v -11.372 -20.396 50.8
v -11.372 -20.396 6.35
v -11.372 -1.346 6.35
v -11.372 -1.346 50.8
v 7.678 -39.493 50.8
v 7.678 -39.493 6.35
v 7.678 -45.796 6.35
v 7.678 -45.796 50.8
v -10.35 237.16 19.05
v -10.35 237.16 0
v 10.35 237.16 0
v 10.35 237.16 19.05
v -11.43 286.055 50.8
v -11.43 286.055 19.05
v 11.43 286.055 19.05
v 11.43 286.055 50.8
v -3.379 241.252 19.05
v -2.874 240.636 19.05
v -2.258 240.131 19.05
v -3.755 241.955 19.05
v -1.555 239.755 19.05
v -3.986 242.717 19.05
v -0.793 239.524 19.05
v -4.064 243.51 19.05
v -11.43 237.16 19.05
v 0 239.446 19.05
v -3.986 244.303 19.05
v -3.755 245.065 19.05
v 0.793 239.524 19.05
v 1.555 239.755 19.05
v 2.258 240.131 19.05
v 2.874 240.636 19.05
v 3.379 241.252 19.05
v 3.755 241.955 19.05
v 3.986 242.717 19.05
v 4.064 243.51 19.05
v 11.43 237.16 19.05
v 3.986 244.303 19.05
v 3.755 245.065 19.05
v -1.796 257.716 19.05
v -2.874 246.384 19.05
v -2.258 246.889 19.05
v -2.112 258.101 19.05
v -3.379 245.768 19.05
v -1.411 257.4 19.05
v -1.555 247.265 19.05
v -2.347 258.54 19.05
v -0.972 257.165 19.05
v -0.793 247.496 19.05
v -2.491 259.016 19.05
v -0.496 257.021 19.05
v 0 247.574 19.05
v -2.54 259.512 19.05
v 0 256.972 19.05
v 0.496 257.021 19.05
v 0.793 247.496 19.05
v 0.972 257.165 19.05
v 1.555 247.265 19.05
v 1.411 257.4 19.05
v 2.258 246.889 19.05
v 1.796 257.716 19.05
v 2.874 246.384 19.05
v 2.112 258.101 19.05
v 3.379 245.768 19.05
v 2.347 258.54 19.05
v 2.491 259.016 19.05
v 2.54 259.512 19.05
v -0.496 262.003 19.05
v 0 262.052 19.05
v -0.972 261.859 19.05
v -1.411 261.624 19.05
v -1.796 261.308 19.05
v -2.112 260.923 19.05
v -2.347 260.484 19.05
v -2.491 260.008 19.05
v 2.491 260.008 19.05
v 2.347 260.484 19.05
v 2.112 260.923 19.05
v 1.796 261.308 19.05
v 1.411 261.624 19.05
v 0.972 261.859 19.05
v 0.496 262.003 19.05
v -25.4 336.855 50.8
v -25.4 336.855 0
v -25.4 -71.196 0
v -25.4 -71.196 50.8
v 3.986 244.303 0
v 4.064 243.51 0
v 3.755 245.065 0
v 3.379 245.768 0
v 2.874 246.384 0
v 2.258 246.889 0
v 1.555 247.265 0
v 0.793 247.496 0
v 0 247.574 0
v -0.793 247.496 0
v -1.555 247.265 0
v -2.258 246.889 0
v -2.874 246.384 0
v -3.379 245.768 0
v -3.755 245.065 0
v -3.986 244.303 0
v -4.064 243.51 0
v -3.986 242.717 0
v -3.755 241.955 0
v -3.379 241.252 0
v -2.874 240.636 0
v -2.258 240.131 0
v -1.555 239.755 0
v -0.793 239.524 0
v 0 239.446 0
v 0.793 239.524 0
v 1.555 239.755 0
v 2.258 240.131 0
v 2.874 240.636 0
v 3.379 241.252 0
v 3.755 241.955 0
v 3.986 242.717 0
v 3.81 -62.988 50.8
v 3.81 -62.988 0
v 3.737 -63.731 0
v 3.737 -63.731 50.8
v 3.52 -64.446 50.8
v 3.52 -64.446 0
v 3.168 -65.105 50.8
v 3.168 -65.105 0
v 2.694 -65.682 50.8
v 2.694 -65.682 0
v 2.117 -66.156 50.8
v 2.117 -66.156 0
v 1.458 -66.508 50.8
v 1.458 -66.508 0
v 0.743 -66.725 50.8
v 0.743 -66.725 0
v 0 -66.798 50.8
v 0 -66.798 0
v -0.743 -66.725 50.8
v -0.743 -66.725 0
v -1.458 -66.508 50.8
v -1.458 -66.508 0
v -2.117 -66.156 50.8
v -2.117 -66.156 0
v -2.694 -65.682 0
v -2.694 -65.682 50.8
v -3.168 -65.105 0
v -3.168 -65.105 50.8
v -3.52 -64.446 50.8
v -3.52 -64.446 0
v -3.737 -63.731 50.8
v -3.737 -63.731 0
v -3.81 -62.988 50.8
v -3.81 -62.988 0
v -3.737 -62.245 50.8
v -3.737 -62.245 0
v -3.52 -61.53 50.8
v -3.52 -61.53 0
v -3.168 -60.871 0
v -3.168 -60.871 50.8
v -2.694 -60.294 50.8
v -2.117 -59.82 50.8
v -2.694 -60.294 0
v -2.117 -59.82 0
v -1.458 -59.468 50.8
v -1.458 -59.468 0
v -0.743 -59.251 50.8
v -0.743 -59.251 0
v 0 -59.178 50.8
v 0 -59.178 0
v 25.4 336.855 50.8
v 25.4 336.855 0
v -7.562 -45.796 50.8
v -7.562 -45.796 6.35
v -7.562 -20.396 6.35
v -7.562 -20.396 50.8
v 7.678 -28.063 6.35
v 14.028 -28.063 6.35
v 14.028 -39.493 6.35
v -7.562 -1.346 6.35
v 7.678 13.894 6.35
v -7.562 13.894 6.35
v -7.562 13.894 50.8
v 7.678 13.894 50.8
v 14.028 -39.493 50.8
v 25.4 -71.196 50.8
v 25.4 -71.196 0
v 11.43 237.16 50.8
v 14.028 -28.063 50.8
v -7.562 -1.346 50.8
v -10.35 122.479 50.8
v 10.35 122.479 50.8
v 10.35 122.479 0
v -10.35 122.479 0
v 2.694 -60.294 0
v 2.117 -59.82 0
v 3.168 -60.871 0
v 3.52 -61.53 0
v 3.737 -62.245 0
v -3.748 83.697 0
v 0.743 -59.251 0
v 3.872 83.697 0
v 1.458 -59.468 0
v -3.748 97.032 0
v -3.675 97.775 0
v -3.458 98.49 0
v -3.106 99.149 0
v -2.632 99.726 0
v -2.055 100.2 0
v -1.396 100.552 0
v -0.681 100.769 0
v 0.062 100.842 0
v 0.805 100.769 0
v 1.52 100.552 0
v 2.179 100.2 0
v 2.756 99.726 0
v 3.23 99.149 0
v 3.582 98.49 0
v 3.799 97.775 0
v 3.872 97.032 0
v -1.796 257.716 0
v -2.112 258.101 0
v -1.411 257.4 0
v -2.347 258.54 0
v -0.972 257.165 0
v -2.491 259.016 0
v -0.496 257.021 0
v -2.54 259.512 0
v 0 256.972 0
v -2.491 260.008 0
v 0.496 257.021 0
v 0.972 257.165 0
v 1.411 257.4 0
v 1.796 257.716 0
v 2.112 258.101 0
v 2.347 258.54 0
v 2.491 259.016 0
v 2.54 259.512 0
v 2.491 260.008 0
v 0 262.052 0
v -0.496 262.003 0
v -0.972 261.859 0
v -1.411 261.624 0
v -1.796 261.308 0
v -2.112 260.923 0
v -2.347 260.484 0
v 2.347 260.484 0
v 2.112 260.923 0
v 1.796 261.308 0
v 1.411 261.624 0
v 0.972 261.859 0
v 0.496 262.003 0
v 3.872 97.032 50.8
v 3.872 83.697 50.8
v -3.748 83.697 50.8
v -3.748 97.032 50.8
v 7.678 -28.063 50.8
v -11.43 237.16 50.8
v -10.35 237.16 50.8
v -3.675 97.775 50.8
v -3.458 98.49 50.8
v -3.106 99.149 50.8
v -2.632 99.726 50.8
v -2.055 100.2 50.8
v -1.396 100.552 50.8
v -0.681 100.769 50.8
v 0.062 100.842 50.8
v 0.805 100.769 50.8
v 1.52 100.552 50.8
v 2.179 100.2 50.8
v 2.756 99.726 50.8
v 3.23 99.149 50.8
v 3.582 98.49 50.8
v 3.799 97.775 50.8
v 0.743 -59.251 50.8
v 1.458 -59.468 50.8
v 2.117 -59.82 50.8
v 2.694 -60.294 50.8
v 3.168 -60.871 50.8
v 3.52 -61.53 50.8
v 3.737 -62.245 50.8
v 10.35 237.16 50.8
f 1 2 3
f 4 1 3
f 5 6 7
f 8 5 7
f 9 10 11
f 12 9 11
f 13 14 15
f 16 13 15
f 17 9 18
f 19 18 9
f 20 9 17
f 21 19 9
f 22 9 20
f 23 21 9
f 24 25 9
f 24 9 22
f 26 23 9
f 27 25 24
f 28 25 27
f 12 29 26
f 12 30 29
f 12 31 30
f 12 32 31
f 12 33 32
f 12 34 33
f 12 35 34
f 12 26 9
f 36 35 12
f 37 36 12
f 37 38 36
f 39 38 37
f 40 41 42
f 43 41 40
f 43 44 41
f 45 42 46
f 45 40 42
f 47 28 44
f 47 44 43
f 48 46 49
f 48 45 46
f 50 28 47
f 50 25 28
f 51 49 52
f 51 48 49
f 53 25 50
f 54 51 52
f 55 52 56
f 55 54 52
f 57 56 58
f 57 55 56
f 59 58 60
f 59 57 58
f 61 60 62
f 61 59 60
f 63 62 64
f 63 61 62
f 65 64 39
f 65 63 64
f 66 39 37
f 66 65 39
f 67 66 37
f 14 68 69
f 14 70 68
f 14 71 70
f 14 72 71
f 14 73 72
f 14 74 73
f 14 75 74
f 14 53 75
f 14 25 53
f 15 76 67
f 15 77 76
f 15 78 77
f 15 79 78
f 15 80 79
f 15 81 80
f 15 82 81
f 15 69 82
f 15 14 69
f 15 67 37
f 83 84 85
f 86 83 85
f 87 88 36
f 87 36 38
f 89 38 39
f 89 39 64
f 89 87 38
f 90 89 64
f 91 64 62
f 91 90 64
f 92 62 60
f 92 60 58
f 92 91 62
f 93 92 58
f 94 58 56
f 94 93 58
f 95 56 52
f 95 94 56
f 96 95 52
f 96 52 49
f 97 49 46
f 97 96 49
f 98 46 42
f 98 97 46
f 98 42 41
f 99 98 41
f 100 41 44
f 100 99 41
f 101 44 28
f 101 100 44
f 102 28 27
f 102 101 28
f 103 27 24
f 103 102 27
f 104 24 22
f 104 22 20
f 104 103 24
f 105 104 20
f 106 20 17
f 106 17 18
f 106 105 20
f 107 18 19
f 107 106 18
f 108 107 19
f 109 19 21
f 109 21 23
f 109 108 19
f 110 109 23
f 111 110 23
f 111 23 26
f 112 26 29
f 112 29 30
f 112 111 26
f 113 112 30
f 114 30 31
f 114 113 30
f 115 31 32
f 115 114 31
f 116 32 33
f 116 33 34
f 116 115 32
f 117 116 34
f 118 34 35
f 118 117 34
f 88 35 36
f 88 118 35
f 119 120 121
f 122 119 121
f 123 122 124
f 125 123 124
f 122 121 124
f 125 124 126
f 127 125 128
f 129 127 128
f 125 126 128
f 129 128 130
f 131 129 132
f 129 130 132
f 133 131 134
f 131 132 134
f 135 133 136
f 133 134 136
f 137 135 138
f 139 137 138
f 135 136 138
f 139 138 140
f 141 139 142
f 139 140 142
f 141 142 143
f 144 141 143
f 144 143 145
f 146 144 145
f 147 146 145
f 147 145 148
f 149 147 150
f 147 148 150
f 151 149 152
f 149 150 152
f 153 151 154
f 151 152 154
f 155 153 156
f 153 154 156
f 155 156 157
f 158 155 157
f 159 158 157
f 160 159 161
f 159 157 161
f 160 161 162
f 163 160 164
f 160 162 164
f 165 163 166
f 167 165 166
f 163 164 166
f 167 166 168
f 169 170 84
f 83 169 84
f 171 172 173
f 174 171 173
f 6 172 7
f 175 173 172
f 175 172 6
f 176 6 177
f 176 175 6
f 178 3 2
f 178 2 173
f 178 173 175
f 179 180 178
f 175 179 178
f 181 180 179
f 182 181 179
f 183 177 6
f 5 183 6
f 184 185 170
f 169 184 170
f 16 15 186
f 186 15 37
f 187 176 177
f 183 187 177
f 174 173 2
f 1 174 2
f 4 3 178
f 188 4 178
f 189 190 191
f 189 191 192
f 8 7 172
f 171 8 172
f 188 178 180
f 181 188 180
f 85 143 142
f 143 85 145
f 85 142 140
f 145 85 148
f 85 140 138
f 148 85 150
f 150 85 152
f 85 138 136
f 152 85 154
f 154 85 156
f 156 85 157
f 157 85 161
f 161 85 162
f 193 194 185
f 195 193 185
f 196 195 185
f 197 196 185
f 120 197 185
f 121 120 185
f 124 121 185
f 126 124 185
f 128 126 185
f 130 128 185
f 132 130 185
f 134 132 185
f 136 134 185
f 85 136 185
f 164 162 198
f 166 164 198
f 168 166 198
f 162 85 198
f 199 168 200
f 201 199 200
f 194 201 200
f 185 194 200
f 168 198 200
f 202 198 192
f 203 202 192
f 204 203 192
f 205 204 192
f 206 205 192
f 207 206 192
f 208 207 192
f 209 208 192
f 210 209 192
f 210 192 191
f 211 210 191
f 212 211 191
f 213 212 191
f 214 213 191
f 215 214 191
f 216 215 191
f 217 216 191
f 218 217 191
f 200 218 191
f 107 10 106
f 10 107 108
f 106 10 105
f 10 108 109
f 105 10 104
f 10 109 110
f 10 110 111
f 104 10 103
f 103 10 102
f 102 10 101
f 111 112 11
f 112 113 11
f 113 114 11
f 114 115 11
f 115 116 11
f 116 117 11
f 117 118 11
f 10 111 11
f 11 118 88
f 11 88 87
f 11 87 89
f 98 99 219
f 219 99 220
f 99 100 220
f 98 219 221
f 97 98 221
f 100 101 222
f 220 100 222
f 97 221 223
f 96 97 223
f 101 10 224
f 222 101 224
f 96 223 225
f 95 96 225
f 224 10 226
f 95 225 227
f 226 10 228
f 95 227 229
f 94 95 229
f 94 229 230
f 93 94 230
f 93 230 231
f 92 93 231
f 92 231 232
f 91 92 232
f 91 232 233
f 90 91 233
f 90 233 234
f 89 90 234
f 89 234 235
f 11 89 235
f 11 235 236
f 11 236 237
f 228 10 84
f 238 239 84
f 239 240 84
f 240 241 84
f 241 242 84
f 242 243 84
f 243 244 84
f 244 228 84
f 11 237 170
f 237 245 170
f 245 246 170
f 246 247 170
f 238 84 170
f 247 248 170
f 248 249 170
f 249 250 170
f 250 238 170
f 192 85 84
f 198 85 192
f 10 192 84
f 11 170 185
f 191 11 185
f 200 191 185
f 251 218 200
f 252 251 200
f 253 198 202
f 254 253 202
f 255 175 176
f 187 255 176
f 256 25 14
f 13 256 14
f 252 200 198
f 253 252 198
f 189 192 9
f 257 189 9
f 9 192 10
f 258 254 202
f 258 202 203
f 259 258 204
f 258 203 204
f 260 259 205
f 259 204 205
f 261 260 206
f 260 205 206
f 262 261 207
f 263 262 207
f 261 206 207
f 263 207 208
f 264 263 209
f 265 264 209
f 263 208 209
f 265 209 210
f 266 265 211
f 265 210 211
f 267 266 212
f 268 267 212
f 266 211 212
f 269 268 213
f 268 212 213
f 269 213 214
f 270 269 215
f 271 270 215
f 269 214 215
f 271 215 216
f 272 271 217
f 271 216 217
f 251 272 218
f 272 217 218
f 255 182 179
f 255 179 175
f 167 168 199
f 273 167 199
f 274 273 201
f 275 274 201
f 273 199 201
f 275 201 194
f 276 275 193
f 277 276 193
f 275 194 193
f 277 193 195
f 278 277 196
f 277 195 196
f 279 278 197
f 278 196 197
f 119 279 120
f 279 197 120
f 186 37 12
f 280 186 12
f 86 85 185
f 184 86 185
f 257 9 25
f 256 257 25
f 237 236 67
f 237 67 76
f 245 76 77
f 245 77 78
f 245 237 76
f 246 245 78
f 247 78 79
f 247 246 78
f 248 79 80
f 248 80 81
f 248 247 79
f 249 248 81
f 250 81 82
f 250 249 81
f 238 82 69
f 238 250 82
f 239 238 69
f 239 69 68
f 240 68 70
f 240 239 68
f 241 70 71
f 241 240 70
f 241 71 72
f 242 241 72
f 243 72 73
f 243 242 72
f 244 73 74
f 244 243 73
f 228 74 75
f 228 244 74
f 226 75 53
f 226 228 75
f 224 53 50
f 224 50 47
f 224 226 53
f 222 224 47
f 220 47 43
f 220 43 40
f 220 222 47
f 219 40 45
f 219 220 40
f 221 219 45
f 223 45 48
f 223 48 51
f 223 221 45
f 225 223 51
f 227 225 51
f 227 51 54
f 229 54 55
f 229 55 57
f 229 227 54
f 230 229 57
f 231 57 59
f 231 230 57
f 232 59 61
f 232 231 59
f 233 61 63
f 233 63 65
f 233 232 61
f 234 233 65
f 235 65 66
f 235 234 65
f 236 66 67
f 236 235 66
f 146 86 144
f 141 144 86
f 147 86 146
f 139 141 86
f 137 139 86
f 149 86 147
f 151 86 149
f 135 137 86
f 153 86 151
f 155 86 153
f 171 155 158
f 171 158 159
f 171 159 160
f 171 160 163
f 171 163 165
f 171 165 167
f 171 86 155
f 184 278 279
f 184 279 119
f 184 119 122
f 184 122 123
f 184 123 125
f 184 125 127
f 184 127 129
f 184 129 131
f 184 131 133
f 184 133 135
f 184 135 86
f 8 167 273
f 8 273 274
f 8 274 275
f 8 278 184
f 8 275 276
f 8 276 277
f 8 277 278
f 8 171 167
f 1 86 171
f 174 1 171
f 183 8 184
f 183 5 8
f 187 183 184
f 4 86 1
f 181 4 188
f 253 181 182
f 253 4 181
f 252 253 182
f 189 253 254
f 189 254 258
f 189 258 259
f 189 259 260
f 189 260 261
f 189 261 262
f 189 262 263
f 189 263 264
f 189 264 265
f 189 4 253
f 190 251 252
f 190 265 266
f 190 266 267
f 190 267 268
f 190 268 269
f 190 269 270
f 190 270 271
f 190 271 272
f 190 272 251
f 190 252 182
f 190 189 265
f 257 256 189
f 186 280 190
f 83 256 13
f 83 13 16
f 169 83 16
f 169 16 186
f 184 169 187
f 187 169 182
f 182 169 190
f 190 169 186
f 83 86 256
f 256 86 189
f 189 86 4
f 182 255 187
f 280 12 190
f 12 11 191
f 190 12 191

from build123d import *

# Parameters (mm, degrees)
F1_DEPTH = 50.8
F0_R     = 4.064
F0_R_2   = 2.54
F2_DEPTH = 19.05
F3_DEPTH = 6.35
F4_DEPTH = 6.35
F5_DEPTH = 6.35


with BuildPart() as f1:
    # F0 (on Top) → F1 (new body)
    with BuildSketch(Plane.XY):
        Polygon((-25.4, -71.196024), (0, -71.196024), (25.4, -71.196024), (25.4, 336.854976), (-25.4, 336.854976), align=None)
        with BuildLine():
            ThreePointArc((3.81, -62.988114), (-2.694077, -65.682191), (0, -59.178114))
            ThreePointArc((0, -59.178114), (2.694077, -60.294037), (3.81, -62.988114))
        make_face(mode=Mode.SUBTRACT)
        Polygon((7.677816, -45.796024), (0.061908, -45.796024), (0.005436, -45.796024), (-7.562184, -45.796024), (-7.562184, -20.396024), (-11.372184, -20.396024), (-11.372184, -1.346024), (-7.562184, -1.346024), (-7.562184, 13.893976), (0.029683, 13.893976), (7.677816, 13.893976), (7.677816, -28.063114), (14.027816, -28.063114), (14.027816, -39.493114), (7.677816, -39.493114), align=None, mode=Mode.SUBTRACT)
        with BuildLine():
            Line((3.871908, 83.696873), (0.058039, 83.696873))
            Line((0.058039, 83.696873), (-3.748092, 83.696873))
            Line((-3.748092, 83.696873), (-3.748092, 97.031873))
            ThreePointArc((-3.748092, 97.031873), (0.061908, 100.841873), (3.871908, 97.031873))
            Line((3.871908, 97.031873), (3.871908, 83.696873))
        make_face(mode=Mode.SUBTRACT)
        Polygon((10.3505, 122.478976), (0, 122.478976), (-10.3505, 122.478976), (-10.3505, 237.159976), (-11.43, 237.159976), (-11.43, 286.054976), (0, 286.054976), (11.43, 286.054976), (11.43, 237.159976), (10.3505, 237.159976), align=None, mode=Mode.SUBTRACT)
    extrude(amount=F1_DEPTH)

    # F0 (on Top) → F2 (join)
    with BuildSketch(Plane.XY):
        Polygon((-11.43, 237.159976), (-10.3505, 237.159976), (10.3505, 237.159976), (11.43, 237.159976), (11.43, 286.054976), (0, 286.054976), (-11.43, 286.054976), align=None)
        with Locations((0, 243.509976)):
            Circle(F0_R, mode=Mode.SUBTRACT)
        with Locations((0, 259.511976)):
            Circle(F0_R_2, mode=Mode.SUBTRACT)
    extrude(amount=F2_DEPTH)

    # F0 (on Top) → F3 (join)
    with BuildSketch(Plane.XY):
        Polygon((0.005436, -45.796024), (0.061908, -45.796024), (7.677816, -45.796024), (7.677816, -39.493114), (14.027816, -39.493114), (14.027816, -28.063114), (7.677816, -28.063114), (7.677816, 13.893976), (0.029683, 13.893976), align=None)
    extrude(amount=F3_DEPTH)

    # F0 (on Top) → F4 (join)
    with BuildSketch(Plane.XY):
        Polygon((-7.562184, -45.796024), (0.005436, -45.796024), (0.029683, 13.893976), (-7.562184, 13.893976), (-7.562184, -1.346024), (-11.372184, -1.346024), (-11.372184, -20.396024), (-7.562184, -20.396024), align=None)
    extrude(amount=F4_DEPTH)

    # F0 (on Top) → F5 (join)
    with BuildSketch(Plane.XY):
        Polygon((0.005436, -45.796024), (0.061908, -45.796024), (7.677816, -45.796024), (7.677816, -39.493114), (14.027816, -39.493114), (14.027816, -28.063114), (7.677816, -28.063114), (7.677816, 13.893976), (0.029683, 13.893976), align=None)
    extrude(amount=F5_DEPTH)


solid = f1.part
